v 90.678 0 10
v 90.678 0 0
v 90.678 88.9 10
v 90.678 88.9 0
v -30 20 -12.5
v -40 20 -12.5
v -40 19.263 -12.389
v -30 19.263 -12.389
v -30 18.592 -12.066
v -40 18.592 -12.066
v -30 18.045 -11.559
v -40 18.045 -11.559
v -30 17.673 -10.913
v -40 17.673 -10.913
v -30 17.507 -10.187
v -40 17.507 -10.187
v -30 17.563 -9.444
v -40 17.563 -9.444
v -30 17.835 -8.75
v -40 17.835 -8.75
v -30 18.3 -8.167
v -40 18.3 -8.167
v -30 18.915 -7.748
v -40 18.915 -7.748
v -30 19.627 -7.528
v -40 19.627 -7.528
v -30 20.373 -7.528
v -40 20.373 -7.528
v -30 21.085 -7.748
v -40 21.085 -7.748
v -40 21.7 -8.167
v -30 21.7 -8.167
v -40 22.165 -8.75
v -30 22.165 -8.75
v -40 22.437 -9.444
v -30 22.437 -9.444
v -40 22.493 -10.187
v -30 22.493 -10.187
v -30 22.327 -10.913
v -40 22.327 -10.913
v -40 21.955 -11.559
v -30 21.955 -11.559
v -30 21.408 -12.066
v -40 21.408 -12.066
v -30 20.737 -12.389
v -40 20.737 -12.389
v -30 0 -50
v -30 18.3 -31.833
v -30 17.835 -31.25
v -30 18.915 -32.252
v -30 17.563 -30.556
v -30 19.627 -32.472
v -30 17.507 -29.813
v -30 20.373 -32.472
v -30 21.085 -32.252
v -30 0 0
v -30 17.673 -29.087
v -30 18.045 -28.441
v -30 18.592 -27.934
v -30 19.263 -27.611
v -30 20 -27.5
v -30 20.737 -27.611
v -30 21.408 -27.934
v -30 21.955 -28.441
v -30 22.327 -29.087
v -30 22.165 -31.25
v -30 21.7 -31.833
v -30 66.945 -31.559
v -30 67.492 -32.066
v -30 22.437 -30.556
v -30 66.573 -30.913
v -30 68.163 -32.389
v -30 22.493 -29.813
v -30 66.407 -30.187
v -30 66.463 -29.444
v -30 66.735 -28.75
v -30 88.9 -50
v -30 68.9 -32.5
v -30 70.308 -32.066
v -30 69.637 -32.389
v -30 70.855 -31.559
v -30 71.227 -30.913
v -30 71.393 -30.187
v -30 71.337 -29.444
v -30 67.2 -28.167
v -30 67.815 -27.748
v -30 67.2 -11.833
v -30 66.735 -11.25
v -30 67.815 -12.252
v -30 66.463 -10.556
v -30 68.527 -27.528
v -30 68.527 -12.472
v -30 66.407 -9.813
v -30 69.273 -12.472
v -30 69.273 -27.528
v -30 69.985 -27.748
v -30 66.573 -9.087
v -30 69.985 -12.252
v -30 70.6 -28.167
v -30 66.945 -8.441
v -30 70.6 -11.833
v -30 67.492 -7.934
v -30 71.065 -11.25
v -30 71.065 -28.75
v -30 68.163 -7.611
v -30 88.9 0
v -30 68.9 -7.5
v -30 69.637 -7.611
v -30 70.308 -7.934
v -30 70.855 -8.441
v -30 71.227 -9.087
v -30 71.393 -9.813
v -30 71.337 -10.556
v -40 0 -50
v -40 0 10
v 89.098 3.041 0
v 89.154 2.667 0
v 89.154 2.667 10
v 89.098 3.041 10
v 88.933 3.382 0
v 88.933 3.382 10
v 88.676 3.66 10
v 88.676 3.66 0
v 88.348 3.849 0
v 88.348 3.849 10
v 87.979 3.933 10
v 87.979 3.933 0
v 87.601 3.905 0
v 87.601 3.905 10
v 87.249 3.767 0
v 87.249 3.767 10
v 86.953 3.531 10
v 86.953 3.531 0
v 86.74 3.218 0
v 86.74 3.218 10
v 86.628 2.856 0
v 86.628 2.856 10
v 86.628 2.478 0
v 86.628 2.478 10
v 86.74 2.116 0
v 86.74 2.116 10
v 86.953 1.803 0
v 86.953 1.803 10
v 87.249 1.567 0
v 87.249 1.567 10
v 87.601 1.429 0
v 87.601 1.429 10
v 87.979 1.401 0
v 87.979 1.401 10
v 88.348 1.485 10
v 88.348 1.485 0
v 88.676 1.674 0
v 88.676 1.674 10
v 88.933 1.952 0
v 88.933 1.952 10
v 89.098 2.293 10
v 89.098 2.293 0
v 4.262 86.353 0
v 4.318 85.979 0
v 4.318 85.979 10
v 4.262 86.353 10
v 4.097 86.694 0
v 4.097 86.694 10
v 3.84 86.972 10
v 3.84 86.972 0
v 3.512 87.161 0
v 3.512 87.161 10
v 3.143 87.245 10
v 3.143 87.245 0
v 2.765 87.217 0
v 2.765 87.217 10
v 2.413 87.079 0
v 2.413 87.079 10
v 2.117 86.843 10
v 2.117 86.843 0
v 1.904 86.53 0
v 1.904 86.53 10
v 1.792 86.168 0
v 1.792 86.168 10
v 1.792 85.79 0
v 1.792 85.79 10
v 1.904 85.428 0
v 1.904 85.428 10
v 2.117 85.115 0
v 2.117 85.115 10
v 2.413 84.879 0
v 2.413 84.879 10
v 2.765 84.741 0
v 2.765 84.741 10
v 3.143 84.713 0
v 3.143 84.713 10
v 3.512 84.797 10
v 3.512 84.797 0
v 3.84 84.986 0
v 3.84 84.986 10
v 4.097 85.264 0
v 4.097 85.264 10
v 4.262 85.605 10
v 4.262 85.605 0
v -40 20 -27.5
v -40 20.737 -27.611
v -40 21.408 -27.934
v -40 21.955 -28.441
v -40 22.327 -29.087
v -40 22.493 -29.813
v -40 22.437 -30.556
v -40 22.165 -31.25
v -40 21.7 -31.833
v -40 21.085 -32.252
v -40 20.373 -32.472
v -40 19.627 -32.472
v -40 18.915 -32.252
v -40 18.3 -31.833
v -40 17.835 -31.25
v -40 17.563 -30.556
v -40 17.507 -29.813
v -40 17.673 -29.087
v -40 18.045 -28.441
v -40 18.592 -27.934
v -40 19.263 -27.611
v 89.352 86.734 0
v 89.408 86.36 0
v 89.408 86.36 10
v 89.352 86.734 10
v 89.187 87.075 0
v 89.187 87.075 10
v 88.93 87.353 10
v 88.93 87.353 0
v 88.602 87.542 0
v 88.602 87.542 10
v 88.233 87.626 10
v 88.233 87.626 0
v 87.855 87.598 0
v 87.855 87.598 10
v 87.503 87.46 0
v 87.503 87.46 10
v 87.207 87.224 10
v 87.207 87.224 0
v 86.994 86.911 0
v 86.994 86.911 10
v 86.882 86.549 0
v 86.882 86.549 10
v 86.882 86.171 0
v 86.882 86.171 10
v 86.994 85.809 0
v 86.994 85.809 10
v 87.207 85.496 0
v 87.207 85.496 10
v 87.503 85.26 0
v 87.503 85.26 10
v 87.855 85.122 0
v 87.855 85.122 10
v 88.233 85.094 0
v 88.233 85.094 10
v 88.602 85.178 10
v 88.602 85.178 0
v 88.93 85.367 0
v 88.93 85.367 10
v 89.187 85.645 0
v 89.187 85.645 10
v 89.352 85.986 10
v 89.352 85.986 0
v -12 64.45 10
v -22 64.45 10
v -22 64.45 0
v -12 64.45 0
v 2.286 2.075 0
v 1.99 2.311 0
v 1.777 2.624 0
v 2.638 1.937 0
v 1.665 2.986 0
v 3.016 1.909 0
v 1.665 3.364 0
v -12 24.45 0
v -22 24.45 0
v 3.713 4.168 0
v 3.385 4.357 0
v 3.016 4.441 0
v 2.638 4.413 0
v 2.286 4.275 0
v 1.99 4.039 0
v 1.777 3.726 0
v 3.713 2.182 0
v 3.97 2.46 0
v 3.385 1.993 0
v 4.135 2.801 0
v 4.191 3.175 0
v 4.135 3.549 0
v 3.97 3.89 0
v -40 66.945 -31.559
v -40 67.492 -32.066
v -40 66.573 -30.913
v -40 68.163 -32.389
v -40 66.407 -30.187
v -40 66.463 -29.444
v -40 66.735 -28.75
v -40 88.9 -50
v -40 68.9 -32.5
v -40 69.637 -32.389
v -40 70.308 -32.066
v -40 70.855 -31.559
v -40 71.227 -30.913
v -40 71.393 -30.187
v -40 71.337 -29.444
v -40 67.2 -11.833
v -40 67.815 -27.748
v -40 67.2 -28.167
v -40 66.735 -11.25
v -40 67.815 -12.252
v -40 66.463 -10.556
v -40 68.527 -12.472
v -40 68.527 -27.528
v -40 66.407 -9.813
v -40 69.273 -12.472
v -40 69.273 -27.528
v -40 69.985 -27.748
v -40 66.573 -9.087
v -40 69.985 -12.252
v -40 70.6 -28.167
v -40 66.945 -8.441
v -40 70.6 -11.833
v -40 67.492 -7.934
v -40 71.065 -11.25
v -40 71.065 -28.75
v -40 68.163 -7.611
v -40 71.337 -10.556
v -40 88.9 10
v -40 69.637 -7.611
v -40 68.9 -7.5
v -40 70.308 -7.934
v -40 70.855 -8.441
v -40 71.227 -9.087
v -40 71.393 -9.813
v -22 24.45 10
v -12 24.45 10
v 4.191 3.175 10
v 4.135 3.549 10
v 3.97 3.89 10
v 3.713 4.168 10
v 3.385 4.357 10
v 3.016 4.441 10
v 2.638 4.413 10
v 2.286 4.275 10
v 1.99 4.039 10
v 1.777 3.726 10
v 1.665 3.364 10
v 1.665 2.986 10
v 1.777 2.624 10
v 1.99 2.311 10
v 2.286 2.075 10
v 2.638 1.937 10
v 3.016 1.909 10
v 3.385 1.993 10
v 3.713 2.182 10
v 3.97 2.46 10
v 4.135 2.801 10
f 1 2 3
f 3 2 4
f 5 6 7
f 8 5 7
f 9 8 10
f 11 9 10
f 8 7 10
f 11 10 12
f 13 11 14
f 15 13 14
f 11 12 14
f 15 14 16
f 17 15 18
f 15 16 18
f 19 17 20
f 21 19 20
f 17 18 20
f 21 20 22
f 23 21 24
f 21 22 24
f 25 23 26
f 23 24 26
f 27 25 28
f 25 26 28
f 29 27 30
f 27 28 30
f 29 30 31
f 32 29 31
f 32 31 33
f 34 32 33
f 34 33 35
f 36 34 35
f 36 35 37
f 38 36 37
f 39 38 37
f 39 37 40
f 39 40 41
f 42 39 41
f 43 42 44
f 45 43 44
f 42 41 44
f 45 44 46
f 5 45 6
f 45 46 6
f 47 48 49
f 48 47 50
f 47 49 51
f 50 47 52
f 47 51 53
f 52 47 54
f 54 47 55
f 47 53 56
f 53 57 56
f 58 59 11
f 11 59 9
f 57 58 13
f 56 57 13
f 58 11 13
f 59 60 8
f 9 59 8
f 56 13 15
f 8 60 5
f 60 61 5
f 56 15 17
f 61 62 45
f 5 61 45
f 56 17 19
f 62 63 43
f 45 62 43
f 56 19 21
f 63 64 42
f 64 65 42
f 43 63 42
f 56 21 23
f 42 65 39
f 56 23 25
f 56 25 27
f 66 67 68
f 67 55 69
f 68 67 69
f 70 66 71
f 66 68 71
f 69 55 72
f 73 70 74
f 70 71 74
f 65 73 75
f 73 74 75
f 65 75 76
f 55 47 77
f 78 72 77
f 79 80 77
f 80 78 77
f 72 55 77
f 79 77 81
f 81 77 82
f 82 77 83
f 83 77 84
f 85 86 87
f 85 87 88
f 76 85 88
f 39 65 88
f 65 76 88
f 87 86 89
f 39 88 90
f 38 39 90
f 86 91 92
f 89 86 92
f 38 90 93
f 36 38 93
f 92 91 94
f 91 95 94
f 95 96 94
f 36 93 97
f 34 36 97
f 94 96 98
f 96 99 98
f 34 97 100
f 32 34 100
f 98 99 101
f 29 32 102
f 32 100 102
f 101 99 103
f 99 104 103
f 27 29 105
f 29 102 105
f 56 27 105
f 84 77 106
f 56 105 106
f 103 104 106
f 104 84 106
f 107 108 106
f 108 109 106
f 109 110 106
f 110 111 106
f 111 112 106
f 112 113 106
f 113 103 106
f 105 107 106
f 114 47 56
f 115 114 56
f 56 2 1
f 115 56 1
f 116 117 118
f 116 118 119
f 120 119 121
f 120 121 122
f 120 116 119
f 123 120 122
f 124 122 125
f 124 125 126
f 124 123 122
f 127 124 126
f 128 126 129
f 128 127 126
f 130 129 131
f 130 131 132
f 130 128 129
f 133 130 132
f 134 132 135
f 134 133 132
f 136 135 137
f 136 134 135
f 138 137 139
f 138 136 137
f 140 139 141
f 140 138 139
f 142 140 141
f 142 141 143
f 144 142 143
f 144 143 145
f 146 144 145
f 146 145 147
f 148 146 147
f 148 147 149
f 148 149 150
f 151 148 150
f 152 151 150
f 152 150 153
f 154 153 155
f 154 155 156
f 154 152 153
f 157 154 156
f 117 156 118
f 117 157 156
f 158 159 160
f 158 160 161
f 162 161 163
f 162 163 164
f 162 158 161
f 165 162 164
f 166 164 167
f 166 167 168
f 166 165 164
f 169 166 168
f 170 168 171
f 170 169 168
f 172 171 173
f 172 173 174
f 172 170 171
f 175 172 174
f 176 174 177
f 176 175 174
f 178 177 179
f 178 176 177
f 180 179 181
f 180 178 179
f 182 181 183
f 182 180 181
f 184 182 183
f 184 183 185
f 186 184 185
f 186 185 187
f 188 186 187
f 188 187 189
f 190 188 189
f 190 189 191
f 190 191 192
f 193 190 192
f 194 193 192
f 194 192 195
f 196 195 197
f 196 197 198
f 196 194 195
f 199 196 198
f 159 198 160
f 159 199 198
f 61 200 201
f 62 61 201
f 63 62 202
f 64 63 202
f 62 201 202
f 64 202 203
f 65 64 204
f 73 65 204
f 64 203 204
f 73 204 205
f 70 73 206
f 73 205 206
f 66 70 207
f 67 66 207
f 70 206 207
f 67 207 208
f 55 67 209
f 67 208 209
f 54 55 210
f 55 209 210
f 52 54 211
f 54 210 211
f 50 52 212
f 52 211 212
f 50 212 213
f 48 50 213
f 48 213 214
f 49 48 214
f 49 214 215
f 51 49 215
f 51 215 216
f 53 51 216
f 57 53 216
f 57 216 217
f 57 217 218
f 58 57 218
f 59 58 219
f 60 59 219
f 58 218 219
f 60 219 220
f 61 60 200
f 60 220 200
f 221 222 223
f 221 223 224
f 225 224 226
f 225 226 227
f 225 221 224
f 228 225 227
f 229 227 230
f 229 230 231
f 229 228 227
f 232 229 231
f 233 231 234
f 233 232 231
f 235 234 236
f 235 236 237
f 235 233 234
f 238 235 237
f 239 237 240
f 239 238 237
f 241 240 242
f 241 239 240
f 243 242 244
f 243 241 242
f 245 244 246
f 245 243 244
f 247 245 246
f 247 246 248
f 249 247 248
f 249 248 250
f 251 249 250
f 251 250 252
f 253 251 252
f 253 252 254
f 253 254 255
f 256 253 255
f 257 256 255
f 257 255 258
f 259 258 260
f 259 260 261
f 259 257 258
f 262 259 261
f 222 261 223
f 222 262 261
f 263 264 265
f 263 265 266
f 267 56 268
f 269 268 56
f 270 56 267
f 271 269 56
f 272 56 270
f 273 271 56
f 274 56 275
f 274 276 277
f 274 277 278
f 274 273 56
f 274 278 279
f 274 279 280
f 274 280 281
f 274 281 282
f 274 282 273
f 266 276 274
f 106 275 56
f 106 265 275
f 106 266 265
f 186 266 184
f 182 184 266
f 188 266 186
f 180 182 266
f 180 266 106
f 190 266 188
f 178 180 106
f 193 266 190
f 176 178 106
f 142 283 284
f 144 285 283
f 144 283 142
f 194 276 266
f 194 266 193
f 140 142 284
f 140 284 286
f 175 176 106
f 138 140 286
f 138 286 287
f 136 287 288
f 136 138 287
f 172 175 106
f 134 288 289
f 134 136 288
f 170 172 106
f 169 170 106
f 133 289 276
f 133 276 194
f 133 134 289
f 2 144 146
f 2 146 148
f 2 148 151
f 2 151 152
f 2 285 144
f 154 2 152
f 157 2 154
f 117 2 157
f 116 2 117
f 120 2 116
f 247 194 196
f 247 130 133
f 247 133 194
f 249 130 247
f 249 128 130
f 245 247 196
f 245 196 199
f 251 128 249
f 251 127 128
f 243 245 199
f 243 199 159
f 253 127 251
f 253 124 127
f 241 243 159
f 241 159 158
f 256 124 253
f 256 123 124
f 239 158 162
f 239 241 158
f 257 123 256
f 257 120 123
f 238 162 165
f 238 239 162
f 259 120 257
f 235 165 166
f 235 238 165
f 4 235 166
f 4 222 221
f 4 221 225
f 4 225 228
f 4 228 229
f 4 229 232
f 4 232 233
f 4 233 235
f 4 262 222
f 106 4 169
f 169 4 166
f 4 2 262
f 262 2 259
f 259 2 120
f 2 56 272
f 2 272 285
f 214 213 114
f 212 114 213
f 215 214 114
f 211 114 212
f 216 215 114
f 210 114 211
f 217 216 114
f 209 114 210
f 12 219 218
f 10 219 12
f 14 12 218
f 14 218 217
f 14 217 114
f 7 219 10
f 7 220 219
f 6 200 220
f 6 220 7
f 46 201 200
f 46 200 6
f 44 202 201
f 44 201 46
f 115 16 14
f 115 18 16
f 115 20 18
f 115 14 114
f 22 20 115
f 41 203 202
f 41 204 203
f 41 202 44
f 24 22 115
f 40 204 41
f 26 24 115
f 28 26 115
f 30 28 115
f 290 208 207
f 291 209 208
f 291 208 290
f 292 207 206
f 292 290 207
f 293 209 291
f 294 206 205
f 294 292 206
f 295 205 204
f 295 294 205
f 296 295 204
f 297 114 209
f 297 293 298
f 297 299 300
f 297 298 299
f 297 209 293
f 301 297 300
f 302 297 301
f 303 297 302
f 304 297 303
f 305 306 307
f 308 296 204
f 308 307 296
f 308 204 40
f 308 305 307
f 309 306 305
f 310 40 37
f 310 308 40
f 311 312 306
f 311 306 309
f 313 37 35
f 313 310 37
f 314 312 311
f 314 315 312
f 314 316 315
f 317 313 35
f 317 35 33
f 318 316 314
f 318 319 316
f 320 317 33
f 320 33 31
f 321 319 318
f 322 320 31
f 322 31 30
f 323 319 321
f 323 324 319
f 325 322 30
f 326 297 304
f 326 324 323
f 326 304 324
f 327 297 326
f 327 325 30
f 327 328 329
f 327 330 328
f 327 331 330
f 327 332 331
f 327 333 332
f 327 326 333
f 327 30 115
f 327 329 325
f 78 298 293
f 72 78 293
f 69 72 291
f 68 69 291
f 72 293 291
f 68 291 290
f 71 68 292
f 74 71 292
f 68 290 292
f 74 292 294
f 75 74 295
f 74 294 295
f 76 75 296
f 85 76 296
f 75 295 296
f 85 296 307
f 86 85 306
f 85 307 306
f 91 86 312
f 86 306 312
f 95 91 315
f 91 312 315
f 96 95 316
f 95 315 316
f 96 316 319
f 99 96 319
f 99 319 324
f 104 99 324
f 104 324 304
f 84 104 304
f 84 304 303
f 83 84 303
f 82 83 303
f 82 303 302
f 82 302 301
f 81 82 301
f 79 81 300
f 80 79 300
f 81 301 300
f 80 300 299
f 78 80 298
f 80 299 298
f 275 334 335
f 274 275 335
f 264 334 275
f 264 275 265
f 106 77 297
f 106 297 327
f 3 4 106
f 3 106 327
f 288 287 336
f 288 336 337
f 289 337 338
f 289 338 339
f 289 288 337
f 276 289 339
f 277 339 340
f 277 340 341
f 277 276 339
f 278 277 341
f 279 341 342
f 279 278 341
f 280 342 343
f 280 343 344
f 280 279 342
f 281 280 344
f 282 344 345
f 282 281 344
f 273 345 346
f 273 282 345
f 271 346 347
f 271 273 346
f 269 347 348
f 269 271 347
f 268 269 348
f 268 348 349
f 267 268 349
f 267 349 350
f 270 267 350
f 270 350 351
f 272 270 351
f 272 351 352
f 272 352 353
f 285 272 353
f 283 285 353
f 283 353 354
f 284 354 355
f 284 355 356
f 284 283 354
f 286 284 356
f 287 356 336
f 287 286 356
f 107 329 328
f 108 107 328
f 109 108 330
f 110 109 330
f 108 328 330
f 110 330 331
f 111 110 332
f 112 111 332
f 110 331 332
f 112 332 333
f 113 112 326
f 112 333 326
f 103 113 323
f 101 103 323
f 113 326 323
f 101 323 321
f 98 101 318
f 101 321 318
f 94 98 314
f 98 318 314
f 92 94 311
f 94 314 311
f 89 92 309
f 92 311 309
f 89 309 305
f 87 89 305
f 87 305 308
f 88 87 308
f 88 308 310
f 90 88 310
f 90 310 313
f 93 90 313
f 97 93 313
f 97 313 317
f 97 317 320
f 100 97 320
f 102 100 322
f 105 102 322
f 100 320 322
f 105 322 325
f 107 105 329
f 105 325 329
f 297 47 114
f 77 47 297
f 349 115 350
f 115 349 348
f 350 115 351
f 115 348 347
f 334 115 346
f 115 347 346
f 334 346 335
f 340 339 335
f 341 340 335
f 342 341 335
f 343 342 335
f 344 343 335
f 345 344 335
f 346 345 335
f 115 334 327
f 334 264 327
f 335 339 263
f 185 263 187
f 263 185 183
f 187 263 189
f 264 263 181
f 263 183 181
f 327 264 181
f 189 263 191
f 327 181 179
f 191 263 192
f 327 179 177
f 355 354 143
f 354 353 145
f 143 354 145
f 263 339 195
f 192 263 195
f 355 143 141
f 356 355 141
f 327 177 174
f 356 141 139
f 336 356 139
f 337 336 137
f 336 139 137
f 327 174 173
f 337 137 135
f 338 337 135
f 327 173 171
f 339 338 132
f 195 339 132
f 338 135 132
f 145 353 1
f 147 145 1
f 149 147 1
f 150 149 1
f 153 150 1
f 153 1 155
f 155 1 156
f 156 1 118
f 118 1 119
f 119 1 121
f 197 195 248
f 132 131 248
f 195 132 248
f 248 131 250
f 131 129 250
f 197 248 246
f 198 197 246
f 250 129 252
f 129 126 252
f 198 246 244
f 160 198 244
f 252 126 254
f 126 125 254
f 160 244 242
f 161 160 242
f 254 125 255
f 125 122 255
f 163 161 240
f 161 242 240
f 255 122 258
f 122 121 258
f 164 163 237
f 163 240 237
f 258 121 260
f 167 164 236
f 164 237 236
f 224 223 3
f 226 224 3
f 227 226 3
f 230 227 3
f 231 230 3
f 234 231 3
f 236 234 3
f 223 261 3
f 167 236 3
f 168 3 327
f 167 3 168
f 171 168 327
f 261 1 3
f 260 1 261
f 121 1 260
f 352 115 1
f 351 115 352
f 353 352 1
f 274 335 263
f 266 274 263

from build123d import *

# Parameters (mm, degrees)
SKETCH1_W           = 90.678
SKETCH1_H           = 88.9
SKETCH1_R           = 1.27
BOSS_EXTRUDE1_DEPTH = 10
SKETCH2_W           = 10
SKETCH2_H           = 88.9
BOSS_EXTRUDE2_DEPTH = 30
SKETCH5_W           = 10
SKETCH5_H           = 40
CUT_EXTRUDE1_DEPTH  = 10
SKETCH7_W           = 60
SKETCH7_H           = 88.9
BOSS_EXTRUDE3_DEPTH = 10
SKETCH8_R           = 2.5
CUT_EXTRUDE2_DEPTH  = 10


with BuildPart() as part:
    # Sketch1 → Boss-Extrude1 (new body)
    with BuildSketch(Plane.XY):
        with Locations((45.339, 44.45)):
            Rectangle(SKETCH1_W, SKETCH1_H)
        with Locations((2.921, 3.175)):
            Circle(SKETCH1_R, mode=Mode.SUBTRACT)
        with Locations((3.048, 85.979)):
            Circle(SKETCH1_R, mode=Mode.SUBTRACT)
        with Locations((87.884, 2.667)):
            Circle(SKETCH1_R, mode=Mode.SUBTRACT)
        with Locations((88.138, 86.36)):
            Circle(SKETCH1_R, mode=Mode.SUBTRACT)
    extrude(amount=BOSS_EXTRUDE1_DEPTH)

    # Sketch2 → Boss-Extrude2 (add)
    with BuildSketch(Plane.ZY):
        with Locations((5, 44.45)):
            Rectangle(SKETCH2_W, SKETCH2_H)
    extrude(amount=BOSS_EXTRUDE2_DEPTH)

    # Sketch5 → Cut-Extrude1 (cut)
    with BuildSketch(Plane.XY.offset(10)):
        with Locations((-17, 44.45)):
            Rectangle(SKETCH5_W, SKETCH5_H)
    extrude(amount=-CUT_EXTRUDE1_DEPTH, mode=Mode.SUBTRACT)

    # Sketch7 → Boss-Extrude3 (add)
    with BuildSketch(Plane.ZY.offset(30)):
        with Locations((-20, 44.45)):
            Rectangle(SKETCH7_W, SKETCH7_H)
    extrude(amount=BOSS_EXTRUDE3_DEPTH)

    # Sketch8 → Cut-Extrude2 (cut)
    with BuildSketch(Plane.ZY.offset(40)):
        with Locations((-10, 68.9)):
            Circle(SKETCH8_R)
        with Locations(Location((-10, 20, 0), (0, 0, 180))):
            Circle(SKETCH8_R)
        with Locations((-30, 20)):
            Circle(SKETCH8_R)
        with Locations(Location((-30, 68.9, 0), (0, 0, 180))):
            Circle(SKETCH8_R)
    extrude(amount=-CUT_EXTRUDE2_DEPTH, mode=Mode.SUBTRACT)


solid = part.part
